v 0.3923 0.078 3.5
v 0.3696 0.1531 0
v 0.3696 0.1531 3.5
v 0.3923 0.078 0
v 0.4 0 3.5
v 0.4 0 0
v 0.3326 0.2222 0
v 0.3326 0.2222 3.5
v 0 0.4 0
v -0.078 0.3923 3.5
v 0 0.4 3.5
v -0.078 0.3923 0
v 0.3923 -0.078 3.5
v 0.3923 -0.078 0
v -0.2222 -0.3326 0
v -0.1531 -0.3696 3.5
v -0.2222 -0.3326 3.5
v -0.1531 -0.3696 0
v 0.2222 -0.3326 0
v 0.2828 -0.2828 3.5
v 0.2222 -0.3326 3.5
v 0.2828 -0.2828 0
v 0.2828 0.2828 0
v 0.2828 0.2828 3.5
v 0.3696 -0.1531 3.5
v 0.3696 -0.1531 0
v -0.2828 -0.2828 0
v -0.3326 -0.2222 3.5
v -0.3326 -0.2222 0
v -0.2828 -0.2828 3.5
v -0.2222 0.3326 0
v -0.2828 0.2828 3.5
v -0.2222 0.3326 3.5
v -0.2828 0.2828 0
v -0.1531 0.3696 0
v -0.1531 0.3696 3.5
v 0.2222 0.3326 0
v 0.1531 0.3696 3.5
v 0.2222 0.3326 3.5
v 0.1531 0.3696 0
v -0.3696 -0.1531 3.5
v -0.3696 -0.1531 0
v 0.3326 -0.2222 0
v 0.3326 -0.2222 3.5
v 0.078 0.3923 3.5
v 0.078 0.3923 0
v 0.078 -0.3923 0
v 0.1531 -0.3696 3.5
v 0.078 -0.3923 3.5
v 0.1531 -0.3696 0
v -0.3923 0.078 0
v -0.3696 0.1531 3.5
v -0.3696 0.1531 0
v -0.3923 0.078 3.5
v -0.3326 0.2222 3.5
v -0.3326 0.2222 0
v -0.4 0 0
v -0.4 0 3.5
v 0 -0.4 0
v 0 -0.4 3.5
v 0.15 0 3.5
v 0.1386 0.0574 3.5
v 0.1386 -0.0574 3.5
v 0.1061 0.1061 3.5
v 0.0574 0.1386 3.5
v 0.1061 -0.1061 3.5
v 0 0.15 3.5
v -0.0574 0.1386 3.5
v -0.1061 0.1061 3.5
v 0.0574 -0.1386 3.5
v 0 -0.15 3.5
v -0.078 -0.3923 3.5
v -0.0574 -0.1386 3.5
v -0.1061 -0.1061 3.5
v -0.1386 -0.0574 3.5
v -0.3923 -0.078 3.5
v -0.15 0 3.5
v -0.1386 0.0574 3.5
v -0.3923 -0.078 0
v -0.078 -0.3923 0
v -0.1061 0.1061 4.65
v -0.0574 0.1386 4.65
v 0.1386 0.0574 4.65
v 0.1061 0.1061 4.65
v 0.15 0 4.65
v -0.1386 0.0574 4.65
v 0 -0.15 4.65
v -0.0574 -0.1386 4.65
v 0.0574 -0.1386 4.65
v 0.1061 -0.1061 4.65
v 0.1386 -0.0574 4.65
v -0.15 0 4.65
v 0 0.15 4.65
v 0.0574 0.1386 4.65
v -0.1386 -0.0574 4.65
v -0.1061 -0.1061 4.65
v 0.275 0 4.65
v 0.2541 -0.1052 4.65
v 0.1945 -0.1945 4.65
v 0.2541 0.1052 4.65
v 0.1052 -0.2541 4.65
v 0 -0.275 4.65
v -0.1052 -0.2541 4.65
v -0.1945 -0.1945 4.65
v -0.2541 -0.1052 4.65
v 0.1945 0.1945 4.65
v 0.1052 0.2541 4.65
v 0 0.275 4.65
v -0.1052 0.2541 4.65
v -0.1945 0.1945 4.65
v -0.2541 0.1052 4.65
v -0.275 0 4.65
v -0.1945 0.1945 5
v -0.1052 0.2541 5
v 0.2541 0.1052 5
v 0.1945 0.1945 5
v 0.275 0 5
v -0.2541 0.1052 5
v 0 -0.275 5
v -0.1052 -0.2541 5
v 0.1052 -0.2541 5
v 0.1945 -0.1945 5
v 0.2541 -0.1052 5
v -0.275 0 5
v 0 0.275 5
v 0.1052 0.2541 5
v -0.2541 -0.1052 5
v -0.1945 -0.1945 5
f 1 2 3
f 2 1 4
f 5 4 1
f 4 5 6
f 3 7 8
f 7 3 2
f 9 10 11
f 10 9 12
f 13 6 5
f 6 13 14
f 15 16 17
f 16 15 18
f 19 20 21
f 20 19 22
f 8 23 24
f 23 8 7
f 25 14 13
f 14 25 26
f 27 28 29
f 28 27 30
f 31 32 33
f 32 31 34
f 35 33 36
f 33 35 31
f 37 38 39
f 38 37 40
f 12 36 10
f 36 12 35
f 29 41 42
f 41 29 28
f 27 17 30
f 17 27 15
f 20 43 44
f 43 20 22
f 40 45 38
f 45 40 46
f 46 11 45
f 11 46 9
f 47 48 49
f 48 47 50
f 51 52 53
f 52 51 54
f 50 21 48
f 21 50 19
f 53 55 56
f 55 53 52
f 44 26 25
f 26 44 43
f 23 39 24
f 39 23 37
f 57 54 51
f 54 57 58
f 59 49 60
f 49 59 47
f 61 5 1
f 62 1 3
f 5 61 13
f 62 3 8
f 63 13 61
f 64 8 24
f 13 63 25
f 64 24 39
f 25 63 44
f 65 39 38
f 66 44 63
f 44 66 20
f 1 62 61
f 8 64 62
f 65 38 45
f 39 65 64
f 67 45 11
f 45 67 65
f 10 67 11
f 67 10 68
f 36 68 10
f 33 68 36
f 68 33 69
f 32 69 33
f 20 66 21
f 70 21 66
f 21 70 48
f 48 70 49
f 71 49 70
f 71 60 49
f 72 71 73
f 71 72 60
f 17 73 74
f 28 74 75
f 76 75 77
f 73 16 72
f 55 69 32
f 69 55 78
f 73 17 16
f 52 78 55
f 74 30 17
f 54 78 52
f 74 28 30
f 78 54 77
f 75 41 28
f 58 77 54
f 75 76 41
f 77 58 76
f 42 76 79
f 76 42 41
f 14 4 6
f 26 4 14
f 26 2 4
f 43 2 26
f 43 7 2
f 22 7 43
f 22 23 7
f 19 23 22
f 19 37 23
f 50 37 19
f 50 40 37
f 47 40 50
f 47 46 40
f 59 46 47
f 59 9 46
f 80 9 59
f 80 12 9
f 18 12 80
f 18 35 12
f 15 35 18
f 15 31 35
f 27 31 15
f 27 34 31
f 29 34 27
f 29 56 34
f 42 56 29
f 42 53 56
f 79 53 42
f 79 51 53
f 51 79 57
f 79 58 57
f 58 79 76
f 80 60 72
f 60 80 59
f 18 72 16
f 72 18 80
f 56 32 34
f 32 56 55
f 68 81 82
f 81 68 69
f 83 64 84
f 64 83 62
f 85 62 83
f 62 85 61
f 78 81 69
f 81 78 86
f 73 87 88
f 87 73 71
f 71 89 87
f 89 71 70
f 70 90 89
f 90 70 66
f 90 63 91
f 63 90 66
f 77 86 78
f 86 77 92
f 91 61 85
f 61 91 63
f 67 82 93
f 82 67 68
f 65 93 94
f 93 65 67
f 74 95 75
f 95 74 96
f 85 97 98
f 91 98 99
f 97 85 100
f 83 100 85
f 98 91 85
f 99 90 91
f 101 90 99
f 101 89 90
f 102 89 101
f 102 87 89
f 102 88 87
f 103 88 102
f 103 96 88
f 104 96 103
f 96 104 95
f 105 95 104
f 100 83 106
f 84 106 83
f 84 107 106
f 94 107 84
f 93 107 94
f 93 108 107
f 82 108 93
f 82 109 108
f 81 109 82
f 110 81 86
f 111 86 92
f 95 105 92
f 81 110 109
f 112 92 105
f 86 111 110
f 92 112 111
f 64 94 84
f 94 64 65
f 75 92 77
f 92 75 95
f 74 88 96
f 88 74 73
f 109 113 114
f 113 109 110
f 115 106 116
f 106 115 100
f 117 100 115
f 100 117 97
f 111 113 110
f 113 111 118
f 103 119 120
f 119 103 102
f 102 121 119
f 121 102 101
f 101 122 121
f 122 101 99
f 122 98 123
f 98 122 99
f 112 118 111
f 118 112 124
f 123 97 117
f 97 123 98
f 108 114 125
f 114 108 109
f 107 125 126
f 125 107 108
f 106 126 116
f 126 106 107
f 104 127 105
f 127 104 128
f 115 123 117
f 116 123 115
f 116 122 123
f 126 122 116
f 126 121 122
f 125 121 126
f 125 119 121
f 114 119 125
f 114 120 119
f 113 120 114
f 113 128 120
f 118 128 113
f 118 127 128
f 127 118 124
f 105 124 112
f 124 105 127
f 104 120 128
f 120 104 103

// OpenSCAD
// Parameters
body_diameter_mm = 0.8; //[0.4:1.6:0.01]
overall_height_mm = 4.7; //[2.35:9.4:0.01]
body_height_mm = 3.5; //[1.75:7:0.01]
lever_height_mm = 1.2; //[0.6:2.4:0.01]
lever_diameter_mm = 0.3; //[0.15:0.6:0.01]
base_chamfer_mm = 0.05; //[0.02:0.1:0.005]
connection_overlap_mm = 0.05; //[0.02:0.2:0.005]
toggle_diameter_mm = 0.55; //[0.3:1.1:0.01]
toggle_height_mm = 0.35; //[0.15:0.8:0.01]

// Toggle switch - complete geometry
module toggle_switch() {
  union() {
    // Cylindrical Body
    color("DimGray") translate([0, 0, body_height_mm/2])
      cylinder(h=body_height_mm, r=body_diameter_mm/2, center=true, $fn=32);
    
    // Base Chamfer
    color("DimGray") translate([0, 0, base_chamfer_mm])
      cylinder(h=base_chamfer_mm*2, r1=body_diameter_mm/2, r2=max(body_diameter_mm/2 - base_chamfer_mm, body_diameter_mm/4), center=true, $fn=32);
    
    // Actuator Lever
    color("Silver") translate([0, 0, body_height_mm + lever_height_mm/2 - connection_overlap_mm])
      cylinder(h=lever_height_mm, r=lever_diameter_mm/2, center=true, $fn=16);
    
    // Toggle Cap
    color("Silver") translate([0, 0, body_height_mm + lever_height_mm - connection_overlap_mm + toggle_height_mm/2])
      cylinder(h=toggle_height_mm, r=toggle_diameter_mm/2, center=true, $fn=16);
  }
}

// Assembly
module assembly() {
  toggle_switch();
}

assembly();
